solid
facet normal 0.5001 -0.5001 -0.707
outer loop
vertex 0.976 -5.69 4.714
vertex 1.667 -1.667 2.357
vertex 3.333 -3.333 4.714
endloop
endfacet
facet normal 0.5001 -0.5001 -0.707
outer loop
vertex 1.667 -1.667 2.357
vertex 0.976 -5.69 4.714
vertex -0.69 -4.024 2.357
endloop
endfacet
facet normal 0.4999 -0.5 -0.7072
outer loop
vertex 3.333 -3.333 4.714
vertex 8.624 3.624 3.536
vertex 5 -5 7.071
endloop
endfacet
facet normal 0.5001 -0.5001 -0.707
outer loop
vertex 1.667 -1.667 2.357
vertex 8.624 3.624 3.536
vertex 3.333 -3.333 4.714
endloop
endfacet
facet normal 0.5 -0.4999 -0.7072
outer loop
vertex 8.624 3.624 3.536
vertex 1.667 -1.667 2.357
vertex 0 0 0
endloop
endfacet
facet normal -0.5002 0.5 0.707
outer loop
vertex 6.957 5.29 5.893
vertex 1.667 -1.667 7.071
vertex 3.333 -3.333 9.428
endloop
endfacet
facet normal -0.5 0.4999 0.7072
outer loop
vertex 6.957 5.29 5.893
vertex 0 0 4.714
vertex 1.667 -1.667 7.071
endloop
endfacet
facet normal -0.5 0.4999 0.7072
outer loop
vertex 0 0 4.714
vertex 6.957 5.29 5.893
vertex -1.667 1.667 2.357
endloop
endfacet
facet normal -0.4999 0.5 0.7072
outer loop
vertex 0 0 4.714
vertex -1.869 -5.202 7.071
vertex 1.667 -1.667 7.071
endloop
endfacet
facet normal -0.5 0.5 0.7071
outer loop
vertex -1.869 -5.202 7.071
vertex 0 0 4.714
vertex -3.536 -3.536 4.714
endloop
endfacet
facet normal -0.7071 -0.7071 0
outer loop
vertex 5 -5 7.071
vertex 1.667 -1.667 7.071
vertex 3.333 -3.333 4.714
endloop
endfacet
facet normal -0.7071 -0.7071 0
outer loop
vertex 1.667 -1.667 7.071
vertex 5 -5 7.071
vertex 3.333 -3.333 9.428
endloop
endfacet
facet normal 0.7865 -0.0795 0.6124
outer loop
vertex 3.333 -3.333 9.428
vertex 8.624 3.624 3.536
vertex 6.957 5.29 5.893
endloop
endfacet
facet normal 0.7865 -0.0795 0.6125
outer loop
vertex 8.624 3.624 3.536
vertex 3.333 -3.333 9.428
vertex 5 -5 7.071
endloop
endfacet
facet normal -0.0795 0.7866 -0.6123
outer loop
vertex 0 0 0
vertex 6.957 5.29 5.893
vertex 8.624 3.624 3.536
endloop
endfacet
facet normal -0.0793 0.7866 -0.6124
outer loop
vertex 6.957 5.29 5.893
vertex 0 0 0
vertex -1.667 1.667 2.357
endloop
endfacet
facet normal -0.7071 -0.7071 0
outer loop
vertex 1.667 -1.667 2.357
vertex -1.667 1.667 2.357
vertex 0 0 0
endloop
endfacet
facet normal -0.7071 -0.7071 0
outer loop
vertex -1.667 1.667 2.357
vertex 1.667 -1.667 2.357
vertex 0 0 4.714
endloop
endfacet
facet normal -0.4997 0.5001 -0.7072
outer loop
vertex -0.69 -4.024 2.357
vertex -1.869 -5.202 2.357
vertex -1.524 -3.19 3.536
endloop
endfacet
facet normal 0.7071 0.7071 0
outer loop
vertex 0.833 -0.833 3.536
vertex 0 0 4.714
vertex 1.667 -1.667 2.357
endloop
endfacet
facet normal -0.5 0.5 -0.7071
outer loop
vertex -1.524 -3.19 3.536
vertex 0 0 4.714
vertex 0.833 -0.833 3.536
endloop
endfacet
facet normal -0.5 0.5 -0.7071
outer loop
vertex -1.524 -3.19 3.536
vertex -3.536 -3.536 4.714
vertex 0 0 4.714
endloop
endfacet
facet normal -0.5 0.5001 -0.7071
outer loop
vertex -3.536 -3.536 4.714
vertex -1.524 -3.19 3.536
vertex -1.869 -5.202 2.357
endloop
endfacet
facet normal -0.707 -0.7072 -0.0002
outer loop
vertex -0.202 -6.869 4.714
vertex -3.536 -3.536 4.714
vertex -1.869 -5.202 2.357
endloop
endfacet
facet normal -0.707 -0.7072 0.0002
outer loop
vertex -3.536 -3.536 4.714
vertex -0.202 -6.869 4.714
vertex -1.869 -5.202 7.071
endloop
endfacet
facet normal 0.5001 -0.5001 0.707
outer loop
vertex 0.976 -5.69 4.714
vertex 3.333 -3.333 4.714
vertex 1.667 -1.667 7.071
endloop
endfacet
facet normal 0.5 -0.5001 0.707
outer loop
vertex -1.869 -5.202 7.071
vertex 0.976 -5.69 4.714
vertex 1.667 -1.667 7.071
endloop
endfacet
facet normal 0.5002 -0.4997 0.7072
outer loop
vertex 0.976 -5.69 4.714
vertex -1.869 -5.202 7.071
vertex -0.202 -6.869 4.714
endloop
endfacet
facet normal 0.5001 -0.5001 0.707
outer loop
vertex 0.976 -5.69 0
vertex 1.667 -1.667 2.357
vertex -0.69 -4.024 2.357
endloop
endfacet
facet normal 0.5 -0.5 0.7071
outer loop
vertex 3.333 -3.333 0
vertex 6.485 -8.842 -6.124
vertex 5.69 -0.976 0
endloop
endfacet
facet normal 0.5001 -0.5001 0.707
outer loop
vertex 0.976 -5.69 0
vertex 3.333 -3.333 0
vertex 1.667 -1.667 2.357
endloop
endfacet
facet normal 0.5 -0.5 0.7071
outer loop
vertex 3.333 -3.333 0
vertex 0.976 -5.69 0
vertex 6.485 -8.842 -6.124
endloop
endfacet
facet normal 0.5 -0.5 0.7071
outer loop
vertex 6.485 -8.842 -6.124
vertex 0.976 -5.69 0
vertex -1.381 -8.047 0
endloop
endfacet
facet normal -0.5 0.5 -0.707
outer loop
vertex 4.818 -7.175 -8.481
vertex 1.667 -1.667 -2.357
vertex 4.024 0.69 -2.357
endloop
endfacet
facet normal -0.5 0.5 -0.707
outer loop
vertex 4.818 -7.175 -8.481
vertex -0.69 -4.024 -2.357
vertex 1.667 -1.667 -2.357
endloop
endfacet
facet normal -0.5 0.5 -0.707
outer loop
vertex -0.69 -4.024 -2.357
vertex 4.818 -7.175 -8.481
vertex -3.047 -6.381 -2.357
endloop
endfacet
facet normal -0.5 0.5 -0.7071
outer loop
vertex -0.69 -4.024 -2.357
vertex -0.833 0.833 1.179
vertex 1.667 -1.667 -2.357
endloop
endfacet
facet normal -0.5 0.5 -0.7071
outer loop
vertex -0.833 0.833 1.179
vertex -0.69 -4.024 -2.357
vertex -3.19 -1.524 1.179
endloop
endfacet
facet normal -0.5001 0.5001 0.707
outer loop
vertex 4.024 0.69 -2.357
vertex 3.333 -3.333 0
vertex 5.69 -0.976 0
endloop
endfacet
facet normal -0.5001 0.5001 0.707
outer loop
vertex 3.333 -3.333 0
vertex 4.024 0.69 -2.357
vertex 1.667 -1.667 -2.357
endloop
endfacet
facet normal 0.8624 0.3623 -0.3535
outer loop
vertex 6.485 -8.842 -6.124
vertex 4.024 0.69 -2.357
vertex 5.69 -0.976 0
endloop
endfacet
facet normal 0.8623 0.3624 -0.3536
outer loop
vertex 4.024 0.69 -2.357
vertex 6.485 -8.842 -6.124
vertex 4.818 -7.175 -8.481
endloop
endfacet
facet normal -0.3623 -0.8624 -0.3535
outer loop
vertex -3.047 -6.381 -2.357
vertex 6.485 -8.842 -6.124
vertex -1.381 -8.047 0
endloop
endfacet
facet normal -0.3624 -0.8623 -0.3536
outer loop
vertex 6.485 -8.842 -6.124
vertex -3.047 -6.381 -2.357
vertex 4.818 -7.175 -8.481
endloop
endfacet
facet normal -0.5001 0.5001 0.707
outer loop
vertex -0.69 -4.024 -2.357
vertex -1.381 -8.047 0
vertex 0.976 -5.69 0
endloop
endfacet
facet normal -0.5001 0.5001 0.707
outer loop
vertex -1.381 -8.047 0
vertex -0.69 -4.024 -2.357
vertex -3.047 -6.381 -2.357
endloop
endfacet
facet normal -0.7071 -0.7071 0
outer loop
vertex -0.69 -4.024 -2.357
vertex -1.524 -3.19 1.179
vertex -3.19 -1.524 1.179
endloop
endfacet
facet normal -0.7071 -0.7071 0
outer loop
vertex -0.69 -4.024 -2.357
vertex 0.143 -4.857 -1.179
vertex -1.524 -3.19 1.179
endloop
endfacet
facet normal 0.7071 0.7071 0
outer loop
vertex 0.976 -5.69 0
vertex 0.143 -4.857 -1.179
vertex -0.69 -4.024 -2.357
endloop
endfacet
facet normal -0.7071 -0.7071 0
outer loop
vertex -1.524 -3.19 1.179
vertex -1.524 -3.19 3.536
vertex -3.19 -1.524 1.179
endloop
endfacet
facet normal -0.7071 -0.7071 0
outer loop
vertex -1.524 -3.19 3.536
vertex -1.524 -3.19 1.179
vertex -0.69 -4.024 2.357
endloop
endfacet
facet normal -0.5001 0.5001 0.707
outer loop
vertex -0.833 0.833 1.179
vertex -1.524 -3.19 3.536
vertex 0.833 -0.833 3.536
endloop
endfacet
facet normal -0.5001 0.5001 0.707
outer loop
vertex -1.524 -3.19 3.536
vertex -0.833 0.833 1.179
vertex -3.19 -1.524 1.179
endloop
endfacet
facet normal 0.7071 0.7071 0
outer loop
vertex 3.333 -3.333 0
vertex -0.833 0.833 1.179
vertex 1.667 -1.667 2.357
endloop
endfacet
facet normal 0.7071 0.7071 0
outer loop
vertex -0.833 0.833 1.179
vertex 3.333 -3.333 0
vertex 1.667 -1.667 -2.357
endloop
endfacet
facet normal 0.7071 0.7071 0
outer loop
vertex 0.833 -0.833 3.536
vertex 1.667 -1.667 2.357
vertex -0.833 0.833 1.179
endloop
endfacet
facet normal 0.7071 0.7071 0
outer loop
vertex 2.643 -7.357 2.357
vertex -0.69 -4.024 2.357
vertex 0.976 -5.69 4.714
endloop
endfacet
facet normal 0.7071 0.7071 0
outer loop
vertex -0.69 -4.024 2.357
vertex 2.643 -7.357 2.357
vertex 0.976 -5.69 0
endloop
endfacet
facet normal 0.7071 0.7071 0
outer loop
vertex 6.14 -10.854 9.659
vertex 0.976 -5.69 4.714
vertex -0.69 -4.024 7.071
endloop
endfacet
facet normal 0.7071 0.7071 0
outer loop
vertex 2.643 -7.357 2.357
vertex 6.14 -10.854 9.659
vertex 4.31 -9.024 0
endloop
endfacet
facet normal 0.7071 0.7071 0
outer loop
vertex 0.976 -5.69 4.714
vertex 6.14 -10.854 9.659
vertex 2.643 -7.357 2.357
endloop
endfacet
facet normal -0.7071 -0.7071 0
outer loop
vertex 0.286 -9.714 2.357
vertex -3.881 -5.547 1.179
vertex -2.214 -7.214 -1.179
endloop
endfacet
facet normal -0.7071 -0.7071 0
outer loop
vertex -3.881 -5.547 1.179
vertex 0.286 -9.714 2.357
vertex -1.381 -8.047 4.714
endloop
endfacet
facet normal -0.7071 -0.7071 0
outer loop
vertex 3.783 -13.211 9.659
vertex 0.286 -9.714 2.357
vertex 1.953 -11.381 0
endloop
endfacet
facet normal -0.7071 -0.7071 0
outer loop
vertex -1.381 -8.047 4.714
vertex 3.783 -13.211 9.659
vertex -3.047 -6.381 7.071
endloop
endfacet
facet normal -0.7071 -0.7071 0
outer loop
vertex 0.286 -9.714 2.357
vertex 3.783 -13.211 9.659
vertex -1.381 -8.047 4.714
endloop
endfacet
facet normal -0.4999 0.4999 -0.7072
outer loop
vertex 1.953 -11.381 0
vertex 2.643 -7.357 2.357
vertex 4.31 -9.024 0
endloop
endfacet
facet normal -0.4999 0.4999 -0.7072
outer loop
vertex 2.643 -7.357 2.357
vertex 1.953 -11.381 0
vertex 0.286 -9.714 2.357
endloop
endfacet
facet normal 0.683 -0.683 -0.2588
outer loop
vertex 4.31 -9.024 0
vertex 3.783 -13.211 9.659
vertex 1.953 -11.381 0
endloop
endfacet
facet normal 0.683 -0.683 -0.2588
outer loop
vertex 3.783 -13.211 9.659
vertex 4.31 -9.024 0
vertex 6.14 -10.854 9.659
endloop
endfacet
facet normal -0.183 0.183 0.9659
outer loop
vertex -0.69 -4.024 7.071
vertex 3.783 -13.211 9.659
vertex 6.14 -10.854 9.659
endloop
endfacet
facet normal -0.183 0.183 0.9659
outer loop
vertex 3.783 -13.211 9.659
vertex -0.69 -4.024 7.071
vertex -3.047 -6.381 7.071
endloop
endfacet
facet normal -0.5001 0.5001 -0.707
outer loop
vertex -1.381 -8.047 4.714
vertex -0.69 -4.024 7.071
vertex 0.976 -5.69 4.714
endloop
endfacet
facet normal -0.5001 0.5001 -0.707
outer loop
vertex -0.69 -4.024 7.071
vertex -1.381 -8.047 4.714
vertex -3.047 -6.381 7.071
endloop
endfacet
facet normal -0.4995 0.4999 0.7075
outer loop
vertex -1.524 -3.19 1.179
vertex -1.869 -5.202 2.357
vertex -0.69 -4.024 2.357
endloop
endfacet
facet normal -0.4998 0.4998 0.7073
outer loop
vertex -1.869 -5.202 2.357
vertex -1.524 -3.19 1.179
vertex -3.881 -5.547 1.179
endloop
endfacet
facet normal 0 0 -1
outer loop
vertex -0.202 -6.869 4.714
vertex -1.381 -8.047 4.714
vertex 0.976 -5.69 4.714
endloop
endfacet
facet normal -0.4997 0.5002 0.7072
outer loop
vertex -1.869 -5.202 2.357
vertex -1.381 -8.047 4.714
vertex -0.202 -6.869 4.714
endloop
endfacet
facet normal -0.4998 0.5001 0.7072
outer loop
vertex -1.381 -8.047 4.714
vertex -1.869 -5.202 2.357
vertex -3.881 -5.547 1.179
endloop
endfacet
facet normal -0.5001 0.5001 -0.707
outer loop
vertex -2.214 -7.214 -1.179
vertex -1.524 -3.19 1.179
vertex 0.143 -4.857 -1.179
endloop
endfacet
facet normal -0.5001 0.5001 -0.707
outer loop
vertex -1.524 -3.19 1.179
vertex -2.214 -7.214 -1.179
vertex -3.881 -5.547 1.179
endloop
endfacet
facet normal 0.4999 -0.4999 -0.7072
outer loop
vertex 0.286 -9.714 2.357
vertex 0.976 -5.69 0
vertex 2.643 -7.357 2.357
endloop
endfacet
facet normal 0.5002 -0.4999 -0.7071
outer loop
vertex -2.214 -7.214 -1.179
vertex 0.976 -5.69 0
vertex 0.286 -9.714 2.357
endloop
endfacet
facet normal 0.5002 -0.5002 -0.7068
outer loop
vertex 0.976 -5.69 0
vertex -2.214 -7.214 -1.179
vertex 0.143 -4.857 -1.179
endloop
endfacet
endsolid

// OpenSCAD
/*
Wirt OÜ
© 2024 Hannes Tamme
*/

module arrow(l){
    h = l * sqrt(3) / 2;
    linear_extrude(l/3)
        polygon(points=
            [[0,0],
            [l/3, 0],
            [l/3, - l/2],
            [l/(3/2), - l/2],
            [l/(3/2), 0],
            [l, 0],
            [l/2, h]]);
};

module logo(l){
    rotate([0,-45,-45]){
        arrow(l);
            translate([l/3,-l/(3/2),-l/3])
            rotate([-90,0,90])
                arrow(l);
            translate([l/(3/2),-l/3,l/3])
            rotate([0,90,-90])
                arrow(l);
        }
}

logo(10);
